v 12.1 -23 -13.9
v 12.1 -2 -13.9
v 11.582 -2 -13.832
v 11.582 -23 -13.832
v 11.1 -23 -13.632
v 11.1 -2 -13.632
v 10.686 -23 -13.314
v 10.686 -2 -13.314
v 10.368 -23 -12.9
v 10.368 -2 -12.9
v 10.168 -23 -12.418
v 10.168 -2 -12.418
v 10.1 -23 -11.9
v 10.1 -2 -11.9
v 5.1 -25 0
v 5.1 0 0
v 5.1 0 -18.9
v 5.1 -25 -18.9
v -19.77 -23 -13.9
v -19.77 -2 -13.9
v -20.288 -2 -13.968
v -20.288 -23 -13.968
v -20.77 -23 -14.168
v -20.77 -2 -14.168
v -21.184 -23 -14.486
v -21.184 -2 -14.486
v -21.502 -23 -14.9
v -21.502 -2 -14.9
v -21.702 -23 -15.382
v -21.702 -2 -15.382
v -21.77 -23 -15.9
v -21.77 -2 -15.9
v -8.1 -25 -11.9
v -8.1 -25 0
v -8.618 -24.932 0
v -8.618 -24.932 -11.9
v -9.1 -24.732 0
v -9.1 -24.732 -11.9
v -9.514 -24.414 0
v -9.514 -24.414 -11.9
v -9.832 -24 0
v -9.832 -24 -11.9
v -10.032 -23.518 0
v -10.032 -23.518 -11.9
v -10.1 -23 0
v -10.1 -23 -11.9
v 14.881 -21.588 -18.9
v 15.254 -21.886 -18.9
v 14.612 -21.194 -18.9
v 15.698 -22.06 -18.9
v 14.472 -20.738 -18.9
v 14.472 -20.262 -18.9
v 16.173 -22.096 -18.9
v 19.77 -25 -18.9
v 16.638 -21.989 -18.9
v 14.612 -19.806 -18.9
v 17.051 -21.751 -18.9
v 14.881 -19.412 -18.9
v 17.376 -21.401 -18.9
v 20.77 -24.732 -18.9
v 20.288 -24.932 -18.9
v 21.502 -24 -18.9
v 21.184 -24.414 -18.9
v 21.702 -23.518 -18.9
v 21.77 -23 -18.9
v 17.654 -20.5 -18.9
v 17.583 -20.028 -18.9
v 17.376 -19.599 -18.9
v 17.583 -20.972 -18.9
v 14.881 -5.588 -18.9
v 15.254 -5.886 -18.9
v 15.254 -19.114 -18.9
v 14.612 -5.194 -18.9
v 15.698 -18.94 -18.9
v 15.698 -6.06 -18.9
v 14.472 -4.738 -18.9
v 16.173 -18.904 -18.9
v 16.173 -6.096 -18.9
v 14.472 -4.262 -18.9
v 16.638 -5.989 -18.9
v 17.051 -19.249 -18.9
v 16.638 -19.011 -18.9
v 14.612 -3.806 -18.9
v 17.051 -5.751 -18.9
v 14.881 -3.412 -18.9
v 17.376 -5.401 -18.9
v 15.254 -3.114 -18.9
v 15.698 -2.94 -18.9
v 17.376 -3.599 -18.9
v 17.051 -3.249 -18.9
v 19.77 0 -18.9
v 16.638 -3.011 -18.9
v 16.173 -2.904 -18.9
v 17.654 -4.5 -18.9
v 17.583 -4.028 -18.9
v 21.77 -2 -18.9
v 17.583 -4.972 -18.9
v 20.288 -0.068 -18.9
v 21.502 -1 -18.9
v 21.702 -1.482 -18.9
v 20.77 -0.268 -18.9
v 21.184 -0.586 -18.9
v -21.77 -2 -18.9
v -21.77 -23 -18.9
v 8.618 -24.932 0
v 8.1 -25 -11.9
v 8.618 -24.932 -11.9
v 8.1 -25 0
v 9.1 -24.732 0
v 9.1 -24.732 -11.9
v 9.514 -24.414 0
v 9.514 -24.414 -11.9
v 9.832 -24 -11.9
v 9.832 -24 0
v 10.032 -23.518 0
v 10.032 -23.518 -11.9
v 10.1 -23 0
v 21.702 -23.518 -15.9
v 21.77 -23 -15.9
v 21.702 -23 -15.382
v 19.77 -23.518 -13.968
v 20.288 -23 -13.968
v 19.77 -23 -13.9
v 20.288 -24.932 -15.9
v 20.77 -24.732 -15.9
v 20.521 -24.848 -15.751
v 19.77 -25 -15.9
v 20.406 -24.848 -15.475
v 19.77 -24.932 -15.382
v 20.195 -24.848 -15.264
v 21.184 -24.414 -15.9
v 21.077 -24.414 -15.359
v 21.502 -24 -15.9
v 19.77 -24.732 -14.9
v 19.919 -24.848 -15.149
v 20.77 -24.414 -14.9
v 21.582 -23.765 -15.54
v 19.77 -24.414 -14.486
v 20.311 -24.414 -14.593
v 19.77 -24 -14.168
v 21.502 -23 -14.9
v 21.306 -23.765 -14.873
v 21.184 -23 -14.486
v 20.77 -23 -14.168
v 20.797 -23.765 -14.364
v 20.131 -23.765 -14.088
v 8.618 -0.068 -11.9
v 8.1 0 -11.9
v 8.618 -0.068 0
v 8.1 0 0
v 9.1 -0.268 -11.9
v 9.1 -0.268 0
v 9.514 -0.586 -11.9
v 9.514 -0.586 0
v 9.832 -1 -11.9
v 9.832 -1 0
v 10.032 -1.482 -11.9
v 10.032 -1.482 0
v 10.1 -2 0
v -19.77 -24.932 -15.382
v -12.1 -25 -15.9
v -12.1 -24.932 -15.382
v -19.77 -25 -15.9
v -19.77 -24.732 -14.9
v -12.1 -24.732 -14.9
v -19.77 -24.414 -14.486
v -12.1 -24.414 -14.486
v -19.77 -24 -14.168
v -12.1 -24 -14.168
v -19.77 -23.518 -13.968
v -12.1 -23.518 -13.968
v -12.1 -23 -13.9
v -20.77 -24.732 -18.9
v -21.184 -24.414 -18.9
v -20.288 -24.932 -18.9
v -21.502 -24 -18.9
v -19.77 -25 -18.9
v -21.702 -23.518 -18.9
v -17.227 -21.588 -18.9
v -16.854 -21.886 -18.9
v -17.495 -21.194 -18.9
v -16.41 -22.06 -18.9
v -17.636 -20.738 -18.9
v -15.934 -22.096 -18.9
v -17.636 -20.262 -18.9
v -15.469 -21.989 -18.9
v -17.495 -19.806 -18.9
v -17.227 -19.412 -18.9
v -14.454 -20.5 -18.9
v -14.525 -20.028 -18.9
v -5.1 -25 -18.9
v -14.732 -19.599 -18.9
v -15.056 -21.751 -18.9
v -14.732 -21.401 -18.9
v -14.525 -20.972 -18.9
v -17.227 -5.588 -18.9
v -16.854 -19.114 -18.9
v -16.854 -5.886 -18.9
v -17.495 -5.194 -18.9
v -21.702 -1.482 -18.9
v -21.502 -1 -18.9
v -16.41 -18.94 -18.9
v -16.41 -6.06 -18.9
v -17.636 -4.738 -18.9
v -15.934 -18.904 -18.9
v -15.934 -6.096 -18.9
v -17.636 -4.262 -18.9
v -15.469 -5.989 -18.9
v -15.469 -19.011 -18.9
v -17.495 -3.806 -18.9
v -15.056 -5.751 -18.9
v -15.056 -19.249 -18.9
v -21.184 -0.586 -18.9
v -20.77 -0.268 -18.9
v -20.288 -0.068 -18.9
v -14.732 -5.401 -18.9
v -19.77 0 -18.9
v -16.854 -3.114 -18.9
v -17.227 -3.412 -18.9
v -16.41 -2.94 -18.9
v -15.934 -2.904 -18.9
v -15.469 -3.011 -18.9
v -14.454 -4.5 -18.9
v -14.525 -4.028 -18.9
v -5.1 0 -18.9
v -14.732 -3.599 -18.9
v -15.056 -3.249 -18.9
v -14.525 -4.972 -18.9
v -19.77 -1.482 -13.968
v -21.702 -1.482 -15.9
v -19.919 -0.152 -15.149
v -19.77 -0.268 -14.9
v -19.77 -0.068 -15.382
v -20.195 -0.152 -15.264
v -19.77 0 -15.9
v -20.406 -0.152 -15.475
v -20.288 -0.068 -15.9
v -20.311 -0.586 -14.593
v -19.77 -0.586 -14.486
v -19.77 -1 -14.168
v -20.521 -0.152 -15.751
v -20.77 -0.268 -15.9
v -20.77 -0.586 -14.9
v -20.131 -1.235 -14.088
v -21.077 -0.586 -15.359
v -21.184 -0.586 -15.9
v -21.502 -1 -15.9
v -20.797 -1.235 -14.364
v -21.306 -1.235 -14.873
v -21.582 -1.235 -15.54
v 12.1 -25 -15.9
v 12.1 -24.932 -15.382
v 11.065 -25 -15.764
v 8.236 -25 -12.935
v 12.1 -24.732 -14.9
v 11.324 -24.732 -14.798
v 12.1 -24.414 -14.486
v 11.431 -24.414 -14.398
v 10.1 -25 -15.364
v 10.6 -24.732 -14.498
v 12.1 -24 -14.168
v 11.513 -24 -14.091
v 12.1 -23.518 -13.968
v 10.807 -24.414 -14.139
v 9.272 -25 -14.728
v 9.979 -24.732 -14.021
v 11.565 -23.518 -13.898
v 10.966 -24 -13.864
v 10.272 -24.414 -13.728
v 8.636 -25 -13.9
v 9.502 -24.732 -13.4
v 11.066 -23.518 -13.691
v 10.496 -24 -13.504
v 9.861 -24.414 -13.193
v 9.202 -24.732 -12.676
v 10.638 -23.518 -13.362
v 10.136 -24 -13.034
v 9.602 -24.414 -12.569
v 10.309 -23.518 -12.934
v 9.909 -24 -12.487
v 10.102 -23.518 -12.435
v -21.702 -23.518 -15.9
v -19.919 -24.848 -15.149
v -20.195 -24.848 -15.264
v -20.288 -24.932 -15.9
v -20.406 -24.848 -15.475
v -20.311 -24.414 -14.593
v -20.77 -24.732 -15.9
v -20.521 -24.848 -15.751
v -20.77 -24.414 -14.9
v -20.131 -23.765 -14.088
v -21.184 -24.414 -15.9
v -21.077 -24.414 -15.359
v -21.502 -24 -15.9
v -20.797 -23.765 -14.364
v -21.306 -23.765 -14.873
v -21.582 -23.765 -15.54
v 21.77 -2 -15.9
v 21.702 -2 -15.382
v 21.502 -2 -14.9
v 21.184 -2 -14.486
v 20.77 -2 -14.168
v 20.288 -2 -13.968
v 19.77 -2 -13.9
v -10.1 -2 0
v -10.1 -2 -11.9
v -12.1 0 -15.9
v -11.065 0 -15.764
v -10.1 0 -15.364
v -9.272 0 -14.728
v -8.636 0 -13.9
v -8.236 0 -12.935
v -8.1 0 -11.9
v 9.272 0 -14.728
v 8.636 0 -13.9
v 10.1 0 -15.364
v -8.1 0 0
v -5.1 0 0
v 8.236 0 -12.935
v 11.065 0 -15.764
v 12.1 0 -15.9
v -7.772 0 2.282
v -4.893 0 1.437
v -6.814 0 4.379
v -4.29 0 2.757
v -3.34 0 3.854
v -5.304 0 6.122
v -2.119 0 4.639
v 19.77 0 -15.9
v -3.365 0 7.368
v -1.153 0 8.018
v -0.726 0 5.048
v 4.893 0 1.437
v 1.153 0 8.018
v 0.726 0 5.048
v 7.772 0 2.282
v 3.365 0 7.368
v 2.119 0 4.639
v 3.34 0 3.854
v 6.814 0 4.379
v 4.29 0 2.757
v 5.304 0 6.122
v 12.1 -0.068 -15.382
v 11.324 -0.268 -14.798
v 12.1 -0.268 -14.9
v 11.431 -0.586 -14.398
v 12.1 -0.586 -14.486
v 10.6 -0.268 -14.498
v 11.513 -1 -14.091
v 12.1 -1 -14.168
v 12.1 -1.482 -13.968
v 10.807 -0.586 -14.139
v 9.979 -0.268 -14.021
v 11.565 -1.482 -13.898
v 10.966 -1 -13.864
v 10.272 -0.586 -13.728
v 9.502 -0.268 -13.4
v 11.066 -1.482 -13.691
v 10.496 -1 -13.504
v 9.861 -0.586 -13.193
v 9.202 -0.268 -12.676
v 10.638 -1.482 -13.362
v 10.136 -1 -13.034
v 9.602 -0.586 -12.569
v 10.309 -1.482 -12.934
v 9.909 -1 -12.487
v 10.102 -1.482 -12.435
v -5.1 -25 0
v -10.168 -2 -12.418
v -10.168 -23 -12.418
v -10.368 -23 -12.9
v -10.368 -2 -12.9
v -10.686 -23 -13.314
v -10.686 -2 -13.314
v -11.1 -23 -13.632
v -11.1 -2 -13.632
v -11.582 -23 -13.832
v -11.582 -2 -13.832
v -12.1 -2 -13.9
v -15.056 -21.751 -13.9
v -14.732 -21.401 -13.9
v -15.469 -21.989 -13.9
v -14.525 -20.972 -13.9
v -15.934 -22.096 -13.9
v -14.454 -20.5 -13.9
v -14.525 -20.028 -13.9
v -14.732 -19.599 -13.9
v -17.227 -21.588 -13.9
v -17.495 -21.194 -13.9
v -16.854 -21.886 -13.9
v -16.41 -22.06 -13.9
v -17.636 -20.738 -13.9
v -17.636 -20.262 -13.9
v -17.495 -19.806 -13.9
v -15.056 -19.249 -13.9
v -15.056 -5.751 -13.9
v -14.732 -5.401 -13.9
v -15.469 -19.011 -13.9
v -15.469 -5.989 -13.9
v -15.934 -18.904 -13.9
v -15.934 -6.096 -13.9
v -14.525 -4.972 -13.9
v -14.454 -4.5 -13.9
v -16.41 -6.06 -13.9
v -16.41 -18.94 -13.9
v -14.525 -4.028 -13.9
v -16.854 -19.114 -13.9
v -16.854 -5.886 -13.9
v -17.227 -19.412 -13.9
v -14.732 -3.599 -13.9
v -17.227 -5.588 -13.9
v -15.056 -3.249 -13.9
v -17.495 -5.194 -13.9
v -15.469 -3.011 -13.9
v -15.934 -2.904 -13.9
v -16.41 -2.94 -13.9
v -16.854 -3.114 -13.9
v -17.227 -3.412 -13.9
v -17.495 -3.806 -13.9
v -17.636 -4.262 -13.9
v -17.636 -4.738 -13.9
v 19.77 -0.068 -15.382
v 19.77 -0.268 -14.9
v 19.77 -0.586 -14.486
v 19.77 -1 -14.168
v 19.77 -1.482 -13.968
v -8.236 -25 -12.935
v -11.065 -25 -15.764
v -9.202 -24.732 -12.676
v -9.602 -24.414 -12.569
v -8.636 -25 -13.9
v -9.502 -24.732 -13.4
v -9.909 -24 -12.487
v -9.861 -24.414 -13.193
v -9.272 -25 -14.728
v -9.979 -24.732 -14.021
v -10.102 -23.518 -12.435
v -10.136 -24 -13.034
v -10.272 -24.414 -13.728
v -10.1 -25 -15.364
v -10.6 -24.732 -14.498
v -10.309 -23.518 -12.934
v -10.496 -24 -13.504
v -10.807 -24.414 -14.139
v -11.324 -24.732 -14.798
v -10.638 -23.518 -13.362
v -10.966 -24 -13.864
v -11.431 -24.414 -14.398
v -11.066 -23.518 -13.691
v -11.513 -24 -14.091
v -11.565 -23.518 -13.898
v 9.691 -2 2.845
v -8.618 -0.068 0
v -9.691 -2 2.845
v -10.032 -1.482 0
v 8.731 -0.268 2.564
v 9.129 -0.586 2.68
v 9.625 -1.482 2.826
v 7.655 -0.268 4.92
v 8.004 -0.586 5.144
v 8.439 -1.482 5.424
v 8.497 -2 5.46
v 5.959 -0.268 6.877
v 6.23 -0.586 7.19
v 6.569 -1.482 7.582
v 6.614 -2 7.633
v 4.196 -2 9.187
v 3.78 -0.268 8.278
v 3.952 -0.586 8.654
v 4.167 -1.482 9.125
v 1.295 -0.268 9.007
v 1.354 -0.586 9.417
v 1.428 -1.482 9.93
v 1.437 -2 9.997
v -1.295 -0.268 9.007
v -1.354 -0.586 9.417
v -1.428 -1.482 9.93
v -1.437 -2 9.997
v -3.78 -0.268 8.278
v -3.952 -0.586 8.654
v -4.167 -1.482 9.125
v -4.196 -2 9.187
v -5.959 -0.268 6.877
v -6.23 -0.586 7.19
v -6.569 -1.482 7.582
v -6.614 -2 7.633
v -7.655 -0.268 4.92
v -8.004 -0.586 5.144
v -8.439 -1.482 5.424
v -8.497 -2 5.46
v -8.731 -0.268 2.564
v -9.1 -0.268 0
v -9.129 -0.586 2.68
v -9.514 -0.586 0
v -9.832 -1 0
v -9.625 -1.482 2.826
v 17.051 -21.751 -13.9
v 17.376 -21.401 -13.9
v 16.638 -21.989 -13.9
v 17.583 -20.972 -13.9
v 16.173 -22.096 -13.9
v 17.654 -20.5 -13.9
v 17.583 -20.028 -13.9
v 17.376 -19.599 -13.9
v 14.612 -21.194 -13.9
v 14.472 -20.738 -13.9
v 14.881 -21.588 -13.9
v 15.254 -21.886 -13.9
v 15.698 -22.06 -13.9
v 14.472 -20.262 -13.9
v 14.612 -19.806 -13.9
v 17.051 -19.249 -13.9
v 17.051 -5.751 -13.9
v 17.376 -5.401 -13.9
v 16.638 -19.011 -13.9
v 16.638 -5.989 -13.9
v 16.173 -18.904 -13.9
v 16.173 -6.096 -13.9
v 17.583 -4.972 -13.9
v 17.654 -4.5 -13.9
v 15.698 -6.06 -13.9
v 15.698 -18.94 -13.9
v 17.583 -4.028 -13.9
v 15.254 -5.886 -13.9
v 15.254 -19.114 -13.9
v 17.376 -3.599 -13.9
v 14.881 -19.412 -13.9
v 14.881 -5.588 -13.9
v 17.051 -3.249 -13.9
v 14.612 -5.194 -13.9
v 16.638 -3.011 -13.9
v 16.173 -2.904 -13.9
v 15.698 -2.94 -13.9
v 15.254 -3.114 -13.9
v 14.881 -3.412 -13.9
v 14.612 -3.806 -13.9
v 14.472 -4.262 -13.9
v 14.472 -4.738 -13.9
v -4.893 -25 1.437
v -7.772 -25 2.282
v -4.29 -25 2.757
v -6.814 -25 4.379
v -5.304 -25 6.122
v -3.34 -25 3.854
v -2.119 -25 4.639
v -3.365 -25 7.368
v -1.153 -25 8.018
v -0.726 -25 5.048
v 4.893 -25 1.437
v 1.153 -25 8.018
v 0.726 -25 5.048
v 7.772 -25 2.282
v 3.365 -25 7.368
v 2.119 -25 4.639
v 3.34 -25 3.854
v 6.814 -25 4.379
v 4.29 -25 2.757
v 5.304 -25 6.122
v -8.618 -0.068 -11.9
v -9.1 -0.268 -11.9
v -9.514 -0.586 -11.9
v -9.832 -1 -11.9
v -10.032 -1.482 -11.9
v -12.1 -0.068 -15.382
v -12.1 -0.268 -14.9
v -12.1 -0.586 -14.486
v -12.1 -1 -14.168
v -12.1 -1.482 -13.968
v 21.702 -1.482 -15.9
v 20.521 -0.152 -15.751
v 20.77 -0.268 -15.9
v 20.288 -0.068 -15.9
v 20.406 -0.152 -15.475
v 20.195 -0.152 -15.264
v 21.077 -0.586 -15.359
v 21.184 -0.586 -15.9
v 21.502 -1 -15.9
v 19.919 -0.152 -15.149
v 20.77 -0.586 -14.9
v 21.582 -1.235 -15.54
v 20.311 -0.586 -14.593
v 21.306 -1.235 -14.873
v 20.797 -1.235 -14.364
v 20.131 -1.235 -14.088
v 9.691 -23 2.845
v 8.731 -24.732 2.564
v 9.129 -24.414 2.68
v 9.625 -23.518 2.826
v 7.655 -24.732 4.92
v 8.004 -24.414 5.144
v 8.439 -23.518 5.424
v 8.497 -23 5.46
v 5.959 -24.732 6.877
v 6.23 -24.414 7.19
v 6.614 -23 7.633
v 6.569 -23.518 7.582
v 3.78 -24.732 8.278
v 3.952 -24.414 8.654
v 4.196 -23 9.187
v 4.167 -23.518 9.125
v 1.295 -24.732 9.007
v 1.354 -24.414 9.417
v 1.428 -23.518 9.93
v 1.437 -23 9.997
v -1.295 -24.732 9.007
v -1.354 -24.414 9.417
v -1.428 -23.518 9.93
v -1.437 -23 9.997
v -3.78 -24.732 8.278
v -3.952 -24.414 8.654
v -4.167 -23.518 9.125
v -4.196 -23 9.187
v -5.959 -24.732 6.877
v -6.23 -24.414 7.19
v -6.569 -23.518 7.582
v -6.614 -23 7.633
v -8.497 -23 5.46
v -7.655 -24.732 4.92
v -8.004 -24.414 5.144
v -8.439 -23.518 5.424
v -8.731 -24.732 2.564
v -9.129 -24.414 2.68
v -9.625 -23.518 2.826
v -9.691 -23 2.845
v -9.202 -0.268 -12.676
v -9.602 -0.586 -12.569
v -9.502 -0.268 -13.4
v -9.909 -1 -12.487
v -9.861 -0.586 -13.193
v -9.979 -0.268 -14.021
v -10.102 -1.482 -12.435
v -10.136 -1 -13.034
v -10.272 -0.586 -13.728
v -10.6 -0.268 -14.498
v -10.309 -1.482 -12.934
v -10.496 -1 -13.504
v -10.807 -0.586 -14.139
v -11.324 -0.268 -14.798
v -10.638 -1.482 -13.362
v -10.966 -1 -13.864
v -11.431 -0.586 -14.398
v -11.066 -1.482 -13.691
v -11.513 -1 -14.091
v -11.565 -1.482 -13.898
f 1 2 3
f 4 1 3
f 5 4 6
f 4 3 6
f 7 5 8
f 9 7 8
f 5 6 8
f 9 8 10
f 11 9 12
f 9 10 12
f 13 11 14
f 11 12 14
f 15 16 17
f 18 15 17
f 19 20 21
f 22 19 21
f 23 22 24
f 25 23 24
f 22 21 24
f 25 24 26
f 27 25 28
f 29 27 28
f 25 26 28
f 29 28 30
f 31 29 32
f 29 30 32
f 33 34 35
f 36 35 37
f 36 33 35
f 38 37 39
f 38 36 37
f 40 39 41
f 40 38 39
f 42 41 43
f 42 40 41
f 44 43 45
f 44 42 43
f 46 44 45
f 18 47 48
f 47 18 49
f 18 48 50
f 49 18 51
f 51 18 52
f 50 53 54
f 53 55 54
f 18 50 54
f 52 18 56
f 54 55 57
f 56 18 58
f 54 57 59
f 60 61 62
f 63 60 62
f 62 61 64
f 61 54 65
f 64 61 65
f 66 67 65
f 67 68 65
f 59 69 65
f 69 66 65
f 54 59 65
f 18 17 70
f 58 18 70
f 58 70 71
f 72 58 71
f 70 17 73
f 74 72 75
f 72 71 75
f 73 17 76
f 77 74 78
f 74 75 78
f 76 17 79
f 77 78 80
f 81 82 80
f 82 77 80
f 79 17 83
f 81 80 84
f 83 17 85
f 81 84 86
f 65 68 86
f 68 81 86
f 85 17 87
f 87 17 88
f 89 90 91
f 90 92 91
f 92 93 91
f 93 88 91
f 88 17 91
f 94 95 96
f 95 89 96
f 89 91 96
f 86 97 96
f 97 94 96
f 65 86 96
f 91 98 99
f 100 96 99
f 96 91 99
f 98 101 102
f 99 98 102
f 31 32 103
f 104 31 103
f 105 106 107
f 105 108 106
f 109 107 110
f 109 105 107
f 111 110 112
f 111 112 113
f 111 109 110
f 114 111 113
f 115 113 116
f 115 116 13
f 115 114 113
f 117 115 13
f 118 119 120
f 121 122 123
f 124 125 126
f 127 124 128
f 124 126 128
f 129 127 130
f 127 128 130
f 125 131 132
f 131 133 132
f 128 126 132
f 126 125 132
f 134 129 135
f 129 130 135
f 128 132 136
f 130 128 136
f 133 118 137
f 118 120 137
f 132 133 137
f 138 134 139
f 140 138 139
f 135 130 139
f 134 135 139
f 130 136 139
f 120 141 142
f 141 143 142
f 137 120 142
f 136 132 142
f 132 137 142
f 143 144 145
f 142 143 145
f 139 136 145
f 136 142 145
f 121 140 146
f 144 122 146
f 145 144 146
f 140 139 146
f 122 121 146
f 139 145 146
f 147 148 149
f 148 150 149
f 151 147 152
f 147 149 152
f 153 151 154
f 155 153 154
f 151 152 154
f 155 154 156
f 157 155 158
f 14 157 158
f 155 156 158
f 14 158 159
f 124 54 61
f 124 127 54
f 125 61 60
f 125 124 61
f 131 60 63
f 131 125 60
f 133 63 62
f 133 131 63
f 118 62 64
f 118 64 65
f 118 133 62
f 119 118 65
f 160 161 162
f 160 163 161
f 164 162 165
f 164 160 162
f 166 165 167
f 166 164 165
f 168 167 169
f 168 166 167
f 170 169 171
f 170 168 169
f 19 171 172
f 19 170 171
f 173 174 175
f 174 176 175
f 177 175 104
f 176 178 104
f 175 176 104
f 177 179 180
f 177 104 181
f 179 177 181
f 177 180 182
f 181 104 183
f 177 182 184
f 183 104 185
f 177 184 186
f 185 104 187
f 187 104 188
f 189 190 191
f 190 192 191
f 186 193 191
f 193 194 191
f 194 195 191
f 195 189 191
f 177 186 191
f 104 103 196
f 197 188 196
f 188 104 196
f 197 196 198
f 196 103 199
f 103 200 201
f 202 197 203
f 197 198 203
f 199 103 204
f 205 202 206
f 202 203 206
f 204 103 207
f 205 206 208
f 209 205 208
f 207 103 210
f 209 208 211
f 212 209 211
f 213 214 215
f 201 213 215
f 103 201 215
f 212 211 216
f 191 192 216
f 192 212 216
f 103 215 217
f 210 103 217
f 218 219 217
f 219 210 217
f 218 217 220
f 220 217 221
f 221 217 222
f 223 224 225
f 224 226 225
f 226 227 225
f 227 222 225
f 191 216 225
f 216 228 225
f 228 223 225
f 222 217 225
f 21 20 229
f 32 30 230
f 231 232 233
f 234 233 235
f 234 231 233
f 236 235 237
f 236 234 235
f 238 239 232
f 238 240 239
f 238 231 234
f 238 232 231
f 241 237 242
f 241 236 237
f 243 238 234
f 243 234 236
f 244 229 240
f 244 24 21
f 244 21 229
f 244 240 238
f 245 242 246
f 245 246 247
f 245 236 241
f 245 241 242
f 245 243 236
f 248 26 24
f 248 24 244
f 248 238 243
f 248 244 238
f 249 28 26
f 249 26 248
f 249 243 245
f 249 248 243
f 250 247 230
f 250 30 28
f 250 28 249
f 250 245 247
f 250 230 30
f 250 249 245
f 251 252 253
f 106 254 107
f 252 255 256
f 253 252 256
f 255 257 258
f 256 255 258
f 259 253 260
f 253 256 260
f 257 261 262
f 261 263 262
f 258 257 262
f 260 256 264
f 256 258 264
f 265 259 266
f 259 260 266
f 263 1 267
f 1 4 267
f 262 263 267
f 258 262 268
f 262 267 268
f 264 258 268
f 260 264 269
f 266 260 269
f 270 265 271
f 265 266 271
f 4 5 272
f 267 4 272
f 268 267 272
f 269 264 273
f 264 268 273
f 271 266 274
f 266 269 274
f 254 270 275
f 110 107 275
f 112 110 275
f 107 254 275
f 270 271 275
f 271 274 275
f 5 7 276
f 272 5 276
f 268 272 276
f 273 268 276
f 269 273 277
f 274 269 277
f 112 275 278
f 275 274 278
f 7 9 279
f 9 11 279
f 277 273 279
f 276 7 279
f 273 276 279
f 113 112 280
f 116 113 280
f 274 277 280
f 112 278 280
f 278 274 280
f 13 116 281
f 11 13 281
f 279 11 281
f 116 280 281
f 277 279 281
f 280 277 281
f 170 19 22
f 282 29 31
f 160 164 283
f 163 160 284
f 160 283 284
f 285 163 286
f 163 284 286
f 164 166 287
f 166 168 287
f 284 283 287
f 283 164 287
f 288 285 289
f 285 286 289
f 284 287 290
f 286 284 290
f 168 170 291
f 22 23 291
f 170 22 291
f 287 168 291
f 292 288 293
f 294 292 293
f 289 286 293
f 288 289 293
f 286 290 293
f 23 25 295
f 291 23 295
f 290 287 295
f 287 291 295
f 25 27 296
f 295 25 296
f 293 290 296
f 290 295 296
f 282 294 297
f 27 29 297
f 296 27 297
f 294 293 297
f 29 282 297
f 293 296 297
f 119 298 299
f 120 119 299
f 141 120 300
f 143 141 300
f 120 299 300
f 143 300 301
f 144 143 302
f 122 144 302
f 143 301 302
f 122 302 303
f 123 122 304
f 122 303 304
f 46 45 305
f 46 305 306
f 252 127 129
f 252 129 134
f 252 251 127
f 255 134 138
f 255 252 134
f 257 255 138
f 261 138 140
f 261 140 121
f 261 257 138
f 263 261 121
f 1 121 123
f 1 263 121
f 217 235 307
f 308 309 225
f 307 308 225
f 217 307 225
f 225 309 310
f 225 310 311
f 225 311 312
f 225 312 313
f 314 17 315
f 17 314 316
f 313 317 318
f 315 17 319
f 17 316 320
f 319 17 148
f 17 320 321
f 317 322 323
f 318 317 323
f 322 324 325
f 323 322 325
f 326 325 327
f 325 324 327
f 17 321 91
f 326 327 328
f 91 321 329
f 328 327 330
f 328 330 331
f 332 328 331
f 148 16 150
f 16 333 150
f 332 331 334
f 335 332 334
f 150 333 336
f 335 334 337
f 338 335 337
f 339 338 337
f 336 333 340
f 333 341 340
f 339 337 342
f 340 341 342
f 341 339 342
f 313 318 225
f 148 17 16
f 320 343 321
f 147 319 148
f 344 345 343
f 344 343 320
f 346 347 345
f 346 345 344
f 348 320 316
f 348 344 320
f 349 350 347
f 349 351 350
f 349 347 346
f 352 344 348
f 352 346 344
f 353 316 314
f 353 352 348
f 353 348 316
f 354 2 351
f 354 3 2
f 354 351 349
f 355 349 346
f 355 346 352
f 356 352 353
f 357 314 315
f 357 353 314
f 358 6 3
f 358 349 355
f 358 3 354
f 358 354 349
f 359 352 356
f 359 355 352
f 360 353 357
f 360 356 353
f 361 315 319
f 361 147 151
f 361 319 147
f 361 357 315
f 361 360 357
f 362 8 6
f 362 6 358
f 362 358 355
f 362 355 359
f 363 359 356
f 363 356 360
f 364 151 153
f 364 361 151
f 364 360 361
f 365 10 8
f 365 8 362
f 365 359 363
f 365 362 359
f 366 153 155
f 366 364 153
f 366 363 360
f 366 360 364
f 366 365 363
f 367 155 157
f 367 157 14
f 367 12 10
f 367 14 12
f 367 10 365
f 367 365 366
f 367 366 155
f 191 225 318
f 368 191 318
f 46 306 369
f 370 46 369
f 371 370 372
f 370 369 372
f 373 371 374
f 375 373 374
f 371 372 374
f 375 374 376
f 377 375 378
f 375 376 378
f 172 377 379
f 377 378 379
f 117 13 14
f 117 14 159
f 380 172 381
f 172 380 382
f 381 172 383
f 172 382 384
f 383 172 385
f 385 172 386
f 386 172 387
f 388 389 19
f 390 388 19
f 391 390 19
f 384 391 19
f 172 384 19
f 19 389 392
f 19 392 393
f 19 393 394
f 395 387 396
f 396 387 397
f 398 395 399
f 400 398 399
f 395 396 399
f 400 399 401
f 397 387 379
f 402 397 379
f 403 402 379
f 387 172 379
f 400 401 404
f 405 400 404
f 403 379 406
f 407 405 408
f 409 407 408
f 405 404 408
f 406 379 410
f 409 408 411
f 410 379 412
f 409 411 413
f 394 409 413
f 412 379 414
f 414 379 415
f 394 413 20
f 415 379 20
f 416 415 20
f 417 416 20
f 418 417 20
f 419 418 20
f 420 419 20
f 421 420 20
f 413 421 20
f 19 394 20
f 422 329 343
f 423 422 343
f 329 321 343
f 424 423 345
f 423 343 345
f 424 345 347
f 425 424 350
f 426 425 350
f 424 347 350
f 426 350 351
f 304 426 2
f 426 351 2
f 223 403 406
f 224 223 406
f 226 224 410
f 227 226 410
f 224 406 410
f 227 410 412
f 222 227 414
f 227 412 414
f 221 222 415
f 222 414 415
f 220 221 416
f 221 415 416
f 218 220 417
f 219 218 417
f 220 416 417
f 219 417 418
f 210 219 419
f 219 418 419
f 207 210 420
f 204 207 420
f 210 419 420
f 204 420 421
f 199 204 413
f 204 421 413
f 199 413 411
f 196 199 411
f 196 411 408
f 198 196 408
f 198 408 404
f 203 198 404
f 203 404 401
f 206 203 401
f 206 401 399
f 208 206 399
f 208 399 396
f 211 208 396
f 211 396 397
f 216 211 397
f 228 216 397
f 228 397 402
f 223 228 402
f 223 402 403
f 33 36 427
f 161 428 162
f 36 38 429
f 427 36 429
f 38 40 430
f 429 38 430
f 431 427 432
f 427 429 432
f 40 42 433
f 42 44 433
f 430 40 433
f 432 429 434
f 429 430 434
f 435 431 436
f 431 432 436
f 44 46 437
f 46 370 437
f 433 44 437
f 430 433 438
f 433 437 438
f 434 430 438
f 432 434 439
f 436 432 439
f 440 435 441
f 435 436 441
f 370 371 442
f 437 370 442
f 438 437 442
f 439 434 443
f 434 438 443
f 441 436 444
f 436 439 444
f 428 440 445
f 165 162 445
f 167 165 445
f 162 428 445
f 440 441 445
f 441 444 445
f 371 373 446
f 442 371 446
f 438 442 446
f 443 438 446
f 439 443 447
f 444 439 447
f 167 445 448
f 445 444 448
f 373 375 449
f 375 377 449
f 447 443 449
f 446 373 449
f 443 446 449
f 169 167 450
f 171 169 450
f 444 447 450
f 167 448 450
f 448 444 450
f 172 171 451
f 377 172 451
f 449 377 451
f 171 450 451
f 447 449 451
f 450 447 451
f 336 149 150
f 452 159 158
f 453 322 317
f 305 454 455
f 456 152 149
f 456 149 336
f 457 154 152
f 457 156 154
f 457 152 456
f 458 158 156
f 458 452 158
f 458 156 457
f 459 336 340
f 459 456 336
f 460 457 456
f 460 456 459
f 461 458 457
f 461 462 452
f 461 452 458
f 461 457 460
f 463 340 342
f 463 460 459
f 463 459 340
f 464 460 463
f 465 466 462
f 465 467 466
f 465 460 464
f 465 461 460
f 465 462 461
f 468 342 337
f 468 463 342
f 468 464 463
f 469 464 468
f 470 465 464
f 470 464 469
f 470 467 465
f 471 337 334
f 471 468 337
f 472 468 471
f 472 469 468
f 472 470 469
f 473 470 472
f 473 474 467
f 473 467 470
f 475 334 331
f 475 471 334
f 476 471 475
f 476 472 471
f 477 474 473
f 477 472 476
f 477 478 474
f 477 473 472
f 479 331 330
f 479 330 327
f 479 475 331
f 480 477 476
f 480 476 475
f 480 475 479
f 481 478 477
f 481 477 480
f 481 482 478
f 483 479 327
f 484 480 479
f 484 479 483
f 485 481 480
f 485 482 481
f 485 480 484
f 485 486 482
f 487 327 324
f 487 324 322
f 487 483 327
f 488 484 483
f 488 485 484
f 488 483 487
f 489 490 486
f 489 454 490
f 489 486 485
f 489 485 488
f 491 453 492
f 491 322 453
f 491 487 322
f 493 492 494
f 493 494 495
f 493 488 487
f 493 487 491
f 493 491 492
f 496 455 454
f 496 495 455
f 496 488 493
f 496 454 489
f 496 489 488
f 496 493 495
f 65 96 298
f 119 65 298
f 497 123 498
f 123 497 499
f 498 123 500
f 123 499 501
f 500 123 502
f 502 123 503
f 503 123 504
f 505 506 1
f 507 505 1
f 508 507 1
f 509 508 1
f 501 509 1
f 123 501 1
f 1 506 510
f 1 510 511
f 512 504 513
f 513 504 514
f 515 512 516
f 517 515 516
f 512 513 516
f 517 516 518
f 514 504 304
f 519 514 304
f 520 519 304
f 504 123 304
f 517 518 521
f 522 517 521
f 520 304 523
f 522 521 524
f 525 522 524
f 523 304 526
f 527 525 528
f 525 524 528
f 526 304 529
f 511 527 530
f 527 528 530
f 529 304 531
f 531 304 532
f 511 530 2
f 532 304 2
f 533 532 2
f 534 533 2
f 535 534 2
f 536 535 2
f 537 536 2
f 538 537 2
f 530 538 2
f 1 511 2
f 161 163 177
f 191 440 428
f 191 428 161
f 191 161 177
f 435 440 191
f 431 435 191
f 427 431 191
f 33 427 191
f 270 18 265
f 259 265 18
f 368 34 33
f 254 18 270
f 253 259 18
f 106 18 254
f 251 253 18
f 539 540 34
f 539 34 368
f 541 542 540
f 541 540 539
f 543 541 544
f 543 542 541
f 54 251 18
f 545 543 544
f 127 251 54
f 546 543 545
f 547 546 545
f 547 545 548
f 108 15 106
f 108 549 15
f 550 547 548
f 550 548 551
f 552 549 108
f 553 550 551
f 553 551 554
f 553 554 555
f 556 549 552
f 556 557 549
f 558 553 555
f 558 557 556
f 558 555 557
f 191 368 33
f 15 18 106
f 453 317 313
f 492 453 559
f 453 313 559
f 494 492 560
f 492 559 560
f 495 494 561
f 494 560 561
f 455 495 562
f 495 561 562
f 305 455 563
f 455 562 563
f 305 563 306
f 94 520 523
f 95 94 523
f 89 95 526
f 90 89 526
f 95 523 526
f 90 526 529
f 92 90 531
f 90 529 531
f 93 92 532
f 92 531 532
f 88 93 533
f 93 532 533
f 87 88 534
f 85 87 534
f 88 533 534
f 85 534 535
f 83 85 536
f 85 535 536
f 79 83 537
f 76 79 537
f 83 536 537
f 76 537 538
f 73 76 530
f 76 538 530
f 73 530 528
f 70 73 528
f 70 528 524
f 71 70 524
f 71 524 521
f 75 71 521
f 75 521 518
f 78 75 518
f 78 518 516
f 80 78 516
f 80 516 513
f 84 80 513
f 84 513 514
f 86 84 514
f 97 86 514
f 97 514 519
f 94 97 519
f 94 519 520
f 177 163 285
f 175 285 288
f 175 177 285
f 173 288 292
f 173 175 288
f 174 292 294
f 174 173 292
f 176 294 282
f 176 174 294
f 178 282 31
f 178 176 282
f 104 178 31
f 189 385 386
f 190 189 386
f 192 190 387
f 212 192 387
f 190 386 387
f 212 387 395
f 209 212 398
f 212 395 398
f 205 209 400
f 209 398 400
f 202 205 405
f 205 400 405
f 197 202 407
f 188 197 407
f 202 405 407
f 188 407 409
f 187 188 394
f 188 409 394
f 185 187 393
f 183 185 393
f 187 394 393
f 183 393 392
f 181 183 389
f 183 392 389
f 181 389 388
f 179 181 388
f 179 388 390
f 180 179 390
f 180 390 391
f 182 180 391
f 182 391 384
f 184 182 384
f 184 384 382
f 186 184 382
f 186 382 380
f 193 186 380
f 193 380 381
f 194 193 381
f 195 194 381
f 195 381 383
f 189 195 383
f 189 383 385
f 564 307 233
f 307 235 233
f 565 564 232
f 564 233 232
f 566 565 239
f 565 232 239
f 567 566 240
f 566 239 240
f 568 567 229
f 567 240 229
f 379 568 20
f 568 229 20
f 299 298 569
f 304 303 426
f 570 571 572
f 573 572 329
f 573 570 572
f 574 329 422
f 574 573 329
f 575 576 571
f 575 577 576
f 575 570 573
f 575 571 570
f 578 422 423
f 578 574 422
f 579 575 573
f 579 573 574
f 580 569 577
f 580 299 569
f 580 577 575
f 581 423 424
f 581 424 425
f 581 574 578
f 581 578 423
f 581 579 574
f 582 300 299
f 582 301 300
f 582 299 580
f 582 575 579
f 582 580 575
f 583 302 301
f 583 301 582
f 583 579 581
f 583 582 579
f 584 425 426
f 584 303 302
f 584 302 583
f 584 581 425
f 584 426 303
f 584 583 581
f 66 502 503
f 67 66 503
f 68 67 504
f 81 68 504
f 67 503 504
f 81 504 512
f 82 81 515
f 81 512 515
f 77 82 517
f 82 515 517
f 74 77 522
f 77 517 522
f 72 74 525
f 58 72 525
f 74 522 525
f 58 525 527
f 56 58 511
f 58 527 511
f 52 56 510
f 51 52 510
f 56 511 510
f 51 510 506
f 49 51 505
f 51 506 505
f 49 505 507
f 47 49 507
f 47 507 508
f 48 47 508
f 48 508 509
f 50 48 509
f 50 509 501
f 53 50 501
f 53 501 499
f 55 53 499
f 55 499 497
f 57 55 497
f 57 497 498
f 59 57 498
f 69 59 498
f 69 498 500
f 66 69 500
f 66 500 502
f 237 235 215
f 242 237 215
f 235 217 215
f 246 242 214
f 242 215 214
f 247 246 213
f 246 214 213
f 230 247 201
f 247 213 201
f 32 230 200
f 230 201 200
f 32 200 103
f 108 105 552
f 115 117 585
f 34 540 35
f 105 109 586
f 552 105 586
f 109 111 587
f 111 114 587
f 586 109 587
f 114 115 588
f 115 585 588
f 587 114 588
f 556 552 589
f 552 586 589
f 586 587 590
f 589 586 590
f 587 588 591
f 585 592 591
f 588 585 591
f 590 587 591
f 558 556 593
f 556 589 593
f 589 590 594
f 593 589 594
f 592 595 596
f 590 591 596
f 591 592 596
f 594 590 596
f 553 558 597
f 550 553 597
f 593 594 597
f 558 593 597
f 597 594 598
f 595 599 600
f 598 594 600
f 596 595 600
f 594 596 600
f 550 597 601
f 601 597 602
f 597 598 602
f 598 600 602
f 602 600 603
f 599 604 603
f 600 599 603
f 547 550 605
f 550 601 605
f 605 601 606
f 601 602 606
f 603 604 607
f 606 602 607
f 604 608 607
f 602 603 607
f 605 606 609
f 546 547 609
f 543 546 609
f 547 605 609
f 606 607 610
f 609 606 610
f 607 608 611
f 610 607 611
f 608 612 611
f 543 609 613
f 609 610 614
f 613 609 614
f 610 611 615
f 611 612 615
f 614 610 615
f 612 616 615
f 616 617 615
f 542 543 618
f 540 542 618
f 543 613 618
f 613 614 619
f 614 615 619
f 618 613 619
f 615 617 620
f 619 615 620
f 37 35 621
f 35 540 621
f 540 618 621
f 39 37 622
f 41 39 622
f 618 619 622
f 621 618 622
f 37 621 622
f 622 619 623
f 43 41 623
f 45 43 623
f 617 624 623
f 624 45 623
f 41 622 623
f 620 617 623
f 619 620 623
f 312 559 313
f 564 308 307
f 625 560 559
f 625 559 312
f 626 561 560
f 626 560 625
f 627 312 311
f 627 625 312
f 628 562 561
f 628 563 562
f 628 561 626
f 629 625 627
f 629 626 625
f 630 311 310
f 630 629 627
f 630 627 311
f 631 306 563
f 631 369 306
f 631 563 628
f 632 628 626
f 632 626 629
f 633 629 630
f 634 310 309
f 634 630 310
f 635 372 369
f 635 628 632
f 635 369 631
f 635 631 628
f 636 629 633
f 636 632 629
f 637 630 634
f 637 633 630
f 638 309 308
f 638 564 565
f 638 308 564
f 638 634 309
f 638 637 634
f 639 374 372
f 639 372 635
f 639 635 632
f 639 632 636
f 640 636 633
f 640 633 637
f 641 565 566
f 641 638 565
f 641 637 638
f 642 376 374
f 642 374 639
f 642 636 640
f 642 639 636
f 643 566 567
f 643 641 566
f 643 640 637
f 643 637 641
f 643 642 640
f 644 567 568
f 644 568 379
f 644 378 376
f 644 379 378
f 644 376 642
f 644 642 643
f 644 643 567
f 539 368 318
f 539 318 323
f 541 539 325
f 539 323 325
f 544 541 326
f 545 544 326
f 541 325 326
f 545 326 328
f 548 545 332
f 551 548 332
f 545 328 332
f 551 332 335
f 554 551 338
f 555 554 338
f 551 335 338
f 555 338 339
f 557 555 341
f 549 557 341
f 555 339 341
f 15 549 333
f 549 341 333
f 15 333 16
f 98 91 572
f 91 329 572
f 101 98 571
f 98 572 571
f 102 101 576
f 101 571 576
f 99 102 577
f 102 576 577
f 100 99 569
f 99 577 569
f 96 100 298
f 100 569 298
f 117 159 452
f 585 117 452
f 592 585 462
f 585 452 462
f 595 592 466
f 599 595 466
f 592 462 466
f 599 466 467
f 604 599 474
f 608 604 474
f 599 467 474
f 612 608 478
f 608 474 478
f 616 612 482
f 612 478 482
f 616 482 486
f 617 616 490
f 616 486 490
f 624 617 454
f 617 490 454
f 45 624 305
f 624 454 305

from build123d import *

# Parameters (mm, degrees)
F1_DEPTH = 25
F2_R     = 1.6
F3_DEPTH = 25
F4_R     = 2


with BuildPart() as f1:
    # F0 (on Front) → F1 (new body)
    with BuildSketch(Plane.XZ):
        with BuildLine():
            ThreePointArc((-5.1, 0), (0, 5.1), (5.1, 0))
            Line((5.1, 0), (5.1, -13.9))
            Line((5.1, -13.9), (5.1, -18.9))
            Line((5.1, -18.9), (21.7700861394, -18.9))
            Line((21.7700861394, -18.9), (21.7700861394, -15.9))
            ThreePointArc((21.7700861394, -15.9), (21.1842997018, -14.4857864376), (19.7700861394, -13.9))
            Line((19.7700861394, -13.9), (12.1, -13.9))
            ThreePointArc((12.1, -13.9), (10.6857864376, -13.3142135624), (10.1, -11.9))
            Line((10.1, -11.9), (10.1, 0))
            ThreePointArc((10.1, 0), (0, 10.1), (-10.1, 0))
            Line((-10.1, 0), (-10.1, -11.9))
            ThreePointArc((-10.1, -11.9), (-10.6857864376, -13.3142135624), (-12.1, -13.9))
            Line((-12.1, -13.9), (-19.7700861394, -13.9))
            ThreePointArc((-19.7700861394, -13.9), (-21.1842997018, -14.4857864376), (-21.7700861394, -15.9))
            Line((-21.7700861394, -15.9), (-21.7700861394, -18.9))
            Line((-21.7700861394, -18.9), (-5.1, -18.9))
            Line((-5.1, -18.9), (-5.1, -13.9))
            Line((-5.1, -13.9), (-5.1, 0))
        make_face()
    extrude(amount=F1_DEPTH)

    # F2 (on face) → F3 (cut)
    with BuildSketch(Plane.XY.offset(-13.9)):
        with Locations((16.0536523908, -20.5)):
            Circle(F2_R)
        with Locations((16.0536523908, -4.5)):
            Circle(F2_R)
        with Locations((-16.0536523908, -4.5)):
            Circle(F2_R)
        with Locations((-16.0536523908, -20.5)):
            Circle(F2_R)
    extrude(amount=-F3_DEPTH, mode=Mode.SUBTRACT)

    # F4
    f4_edges = [f1.edges().sort_by_distance(p)[0] for p in [
        (-10.1, -25, -5.95),
        (-10.1, 0, -5.95),
    ]]
    fillet(f4_edges, radius=F4_R)


solid = f1.part
